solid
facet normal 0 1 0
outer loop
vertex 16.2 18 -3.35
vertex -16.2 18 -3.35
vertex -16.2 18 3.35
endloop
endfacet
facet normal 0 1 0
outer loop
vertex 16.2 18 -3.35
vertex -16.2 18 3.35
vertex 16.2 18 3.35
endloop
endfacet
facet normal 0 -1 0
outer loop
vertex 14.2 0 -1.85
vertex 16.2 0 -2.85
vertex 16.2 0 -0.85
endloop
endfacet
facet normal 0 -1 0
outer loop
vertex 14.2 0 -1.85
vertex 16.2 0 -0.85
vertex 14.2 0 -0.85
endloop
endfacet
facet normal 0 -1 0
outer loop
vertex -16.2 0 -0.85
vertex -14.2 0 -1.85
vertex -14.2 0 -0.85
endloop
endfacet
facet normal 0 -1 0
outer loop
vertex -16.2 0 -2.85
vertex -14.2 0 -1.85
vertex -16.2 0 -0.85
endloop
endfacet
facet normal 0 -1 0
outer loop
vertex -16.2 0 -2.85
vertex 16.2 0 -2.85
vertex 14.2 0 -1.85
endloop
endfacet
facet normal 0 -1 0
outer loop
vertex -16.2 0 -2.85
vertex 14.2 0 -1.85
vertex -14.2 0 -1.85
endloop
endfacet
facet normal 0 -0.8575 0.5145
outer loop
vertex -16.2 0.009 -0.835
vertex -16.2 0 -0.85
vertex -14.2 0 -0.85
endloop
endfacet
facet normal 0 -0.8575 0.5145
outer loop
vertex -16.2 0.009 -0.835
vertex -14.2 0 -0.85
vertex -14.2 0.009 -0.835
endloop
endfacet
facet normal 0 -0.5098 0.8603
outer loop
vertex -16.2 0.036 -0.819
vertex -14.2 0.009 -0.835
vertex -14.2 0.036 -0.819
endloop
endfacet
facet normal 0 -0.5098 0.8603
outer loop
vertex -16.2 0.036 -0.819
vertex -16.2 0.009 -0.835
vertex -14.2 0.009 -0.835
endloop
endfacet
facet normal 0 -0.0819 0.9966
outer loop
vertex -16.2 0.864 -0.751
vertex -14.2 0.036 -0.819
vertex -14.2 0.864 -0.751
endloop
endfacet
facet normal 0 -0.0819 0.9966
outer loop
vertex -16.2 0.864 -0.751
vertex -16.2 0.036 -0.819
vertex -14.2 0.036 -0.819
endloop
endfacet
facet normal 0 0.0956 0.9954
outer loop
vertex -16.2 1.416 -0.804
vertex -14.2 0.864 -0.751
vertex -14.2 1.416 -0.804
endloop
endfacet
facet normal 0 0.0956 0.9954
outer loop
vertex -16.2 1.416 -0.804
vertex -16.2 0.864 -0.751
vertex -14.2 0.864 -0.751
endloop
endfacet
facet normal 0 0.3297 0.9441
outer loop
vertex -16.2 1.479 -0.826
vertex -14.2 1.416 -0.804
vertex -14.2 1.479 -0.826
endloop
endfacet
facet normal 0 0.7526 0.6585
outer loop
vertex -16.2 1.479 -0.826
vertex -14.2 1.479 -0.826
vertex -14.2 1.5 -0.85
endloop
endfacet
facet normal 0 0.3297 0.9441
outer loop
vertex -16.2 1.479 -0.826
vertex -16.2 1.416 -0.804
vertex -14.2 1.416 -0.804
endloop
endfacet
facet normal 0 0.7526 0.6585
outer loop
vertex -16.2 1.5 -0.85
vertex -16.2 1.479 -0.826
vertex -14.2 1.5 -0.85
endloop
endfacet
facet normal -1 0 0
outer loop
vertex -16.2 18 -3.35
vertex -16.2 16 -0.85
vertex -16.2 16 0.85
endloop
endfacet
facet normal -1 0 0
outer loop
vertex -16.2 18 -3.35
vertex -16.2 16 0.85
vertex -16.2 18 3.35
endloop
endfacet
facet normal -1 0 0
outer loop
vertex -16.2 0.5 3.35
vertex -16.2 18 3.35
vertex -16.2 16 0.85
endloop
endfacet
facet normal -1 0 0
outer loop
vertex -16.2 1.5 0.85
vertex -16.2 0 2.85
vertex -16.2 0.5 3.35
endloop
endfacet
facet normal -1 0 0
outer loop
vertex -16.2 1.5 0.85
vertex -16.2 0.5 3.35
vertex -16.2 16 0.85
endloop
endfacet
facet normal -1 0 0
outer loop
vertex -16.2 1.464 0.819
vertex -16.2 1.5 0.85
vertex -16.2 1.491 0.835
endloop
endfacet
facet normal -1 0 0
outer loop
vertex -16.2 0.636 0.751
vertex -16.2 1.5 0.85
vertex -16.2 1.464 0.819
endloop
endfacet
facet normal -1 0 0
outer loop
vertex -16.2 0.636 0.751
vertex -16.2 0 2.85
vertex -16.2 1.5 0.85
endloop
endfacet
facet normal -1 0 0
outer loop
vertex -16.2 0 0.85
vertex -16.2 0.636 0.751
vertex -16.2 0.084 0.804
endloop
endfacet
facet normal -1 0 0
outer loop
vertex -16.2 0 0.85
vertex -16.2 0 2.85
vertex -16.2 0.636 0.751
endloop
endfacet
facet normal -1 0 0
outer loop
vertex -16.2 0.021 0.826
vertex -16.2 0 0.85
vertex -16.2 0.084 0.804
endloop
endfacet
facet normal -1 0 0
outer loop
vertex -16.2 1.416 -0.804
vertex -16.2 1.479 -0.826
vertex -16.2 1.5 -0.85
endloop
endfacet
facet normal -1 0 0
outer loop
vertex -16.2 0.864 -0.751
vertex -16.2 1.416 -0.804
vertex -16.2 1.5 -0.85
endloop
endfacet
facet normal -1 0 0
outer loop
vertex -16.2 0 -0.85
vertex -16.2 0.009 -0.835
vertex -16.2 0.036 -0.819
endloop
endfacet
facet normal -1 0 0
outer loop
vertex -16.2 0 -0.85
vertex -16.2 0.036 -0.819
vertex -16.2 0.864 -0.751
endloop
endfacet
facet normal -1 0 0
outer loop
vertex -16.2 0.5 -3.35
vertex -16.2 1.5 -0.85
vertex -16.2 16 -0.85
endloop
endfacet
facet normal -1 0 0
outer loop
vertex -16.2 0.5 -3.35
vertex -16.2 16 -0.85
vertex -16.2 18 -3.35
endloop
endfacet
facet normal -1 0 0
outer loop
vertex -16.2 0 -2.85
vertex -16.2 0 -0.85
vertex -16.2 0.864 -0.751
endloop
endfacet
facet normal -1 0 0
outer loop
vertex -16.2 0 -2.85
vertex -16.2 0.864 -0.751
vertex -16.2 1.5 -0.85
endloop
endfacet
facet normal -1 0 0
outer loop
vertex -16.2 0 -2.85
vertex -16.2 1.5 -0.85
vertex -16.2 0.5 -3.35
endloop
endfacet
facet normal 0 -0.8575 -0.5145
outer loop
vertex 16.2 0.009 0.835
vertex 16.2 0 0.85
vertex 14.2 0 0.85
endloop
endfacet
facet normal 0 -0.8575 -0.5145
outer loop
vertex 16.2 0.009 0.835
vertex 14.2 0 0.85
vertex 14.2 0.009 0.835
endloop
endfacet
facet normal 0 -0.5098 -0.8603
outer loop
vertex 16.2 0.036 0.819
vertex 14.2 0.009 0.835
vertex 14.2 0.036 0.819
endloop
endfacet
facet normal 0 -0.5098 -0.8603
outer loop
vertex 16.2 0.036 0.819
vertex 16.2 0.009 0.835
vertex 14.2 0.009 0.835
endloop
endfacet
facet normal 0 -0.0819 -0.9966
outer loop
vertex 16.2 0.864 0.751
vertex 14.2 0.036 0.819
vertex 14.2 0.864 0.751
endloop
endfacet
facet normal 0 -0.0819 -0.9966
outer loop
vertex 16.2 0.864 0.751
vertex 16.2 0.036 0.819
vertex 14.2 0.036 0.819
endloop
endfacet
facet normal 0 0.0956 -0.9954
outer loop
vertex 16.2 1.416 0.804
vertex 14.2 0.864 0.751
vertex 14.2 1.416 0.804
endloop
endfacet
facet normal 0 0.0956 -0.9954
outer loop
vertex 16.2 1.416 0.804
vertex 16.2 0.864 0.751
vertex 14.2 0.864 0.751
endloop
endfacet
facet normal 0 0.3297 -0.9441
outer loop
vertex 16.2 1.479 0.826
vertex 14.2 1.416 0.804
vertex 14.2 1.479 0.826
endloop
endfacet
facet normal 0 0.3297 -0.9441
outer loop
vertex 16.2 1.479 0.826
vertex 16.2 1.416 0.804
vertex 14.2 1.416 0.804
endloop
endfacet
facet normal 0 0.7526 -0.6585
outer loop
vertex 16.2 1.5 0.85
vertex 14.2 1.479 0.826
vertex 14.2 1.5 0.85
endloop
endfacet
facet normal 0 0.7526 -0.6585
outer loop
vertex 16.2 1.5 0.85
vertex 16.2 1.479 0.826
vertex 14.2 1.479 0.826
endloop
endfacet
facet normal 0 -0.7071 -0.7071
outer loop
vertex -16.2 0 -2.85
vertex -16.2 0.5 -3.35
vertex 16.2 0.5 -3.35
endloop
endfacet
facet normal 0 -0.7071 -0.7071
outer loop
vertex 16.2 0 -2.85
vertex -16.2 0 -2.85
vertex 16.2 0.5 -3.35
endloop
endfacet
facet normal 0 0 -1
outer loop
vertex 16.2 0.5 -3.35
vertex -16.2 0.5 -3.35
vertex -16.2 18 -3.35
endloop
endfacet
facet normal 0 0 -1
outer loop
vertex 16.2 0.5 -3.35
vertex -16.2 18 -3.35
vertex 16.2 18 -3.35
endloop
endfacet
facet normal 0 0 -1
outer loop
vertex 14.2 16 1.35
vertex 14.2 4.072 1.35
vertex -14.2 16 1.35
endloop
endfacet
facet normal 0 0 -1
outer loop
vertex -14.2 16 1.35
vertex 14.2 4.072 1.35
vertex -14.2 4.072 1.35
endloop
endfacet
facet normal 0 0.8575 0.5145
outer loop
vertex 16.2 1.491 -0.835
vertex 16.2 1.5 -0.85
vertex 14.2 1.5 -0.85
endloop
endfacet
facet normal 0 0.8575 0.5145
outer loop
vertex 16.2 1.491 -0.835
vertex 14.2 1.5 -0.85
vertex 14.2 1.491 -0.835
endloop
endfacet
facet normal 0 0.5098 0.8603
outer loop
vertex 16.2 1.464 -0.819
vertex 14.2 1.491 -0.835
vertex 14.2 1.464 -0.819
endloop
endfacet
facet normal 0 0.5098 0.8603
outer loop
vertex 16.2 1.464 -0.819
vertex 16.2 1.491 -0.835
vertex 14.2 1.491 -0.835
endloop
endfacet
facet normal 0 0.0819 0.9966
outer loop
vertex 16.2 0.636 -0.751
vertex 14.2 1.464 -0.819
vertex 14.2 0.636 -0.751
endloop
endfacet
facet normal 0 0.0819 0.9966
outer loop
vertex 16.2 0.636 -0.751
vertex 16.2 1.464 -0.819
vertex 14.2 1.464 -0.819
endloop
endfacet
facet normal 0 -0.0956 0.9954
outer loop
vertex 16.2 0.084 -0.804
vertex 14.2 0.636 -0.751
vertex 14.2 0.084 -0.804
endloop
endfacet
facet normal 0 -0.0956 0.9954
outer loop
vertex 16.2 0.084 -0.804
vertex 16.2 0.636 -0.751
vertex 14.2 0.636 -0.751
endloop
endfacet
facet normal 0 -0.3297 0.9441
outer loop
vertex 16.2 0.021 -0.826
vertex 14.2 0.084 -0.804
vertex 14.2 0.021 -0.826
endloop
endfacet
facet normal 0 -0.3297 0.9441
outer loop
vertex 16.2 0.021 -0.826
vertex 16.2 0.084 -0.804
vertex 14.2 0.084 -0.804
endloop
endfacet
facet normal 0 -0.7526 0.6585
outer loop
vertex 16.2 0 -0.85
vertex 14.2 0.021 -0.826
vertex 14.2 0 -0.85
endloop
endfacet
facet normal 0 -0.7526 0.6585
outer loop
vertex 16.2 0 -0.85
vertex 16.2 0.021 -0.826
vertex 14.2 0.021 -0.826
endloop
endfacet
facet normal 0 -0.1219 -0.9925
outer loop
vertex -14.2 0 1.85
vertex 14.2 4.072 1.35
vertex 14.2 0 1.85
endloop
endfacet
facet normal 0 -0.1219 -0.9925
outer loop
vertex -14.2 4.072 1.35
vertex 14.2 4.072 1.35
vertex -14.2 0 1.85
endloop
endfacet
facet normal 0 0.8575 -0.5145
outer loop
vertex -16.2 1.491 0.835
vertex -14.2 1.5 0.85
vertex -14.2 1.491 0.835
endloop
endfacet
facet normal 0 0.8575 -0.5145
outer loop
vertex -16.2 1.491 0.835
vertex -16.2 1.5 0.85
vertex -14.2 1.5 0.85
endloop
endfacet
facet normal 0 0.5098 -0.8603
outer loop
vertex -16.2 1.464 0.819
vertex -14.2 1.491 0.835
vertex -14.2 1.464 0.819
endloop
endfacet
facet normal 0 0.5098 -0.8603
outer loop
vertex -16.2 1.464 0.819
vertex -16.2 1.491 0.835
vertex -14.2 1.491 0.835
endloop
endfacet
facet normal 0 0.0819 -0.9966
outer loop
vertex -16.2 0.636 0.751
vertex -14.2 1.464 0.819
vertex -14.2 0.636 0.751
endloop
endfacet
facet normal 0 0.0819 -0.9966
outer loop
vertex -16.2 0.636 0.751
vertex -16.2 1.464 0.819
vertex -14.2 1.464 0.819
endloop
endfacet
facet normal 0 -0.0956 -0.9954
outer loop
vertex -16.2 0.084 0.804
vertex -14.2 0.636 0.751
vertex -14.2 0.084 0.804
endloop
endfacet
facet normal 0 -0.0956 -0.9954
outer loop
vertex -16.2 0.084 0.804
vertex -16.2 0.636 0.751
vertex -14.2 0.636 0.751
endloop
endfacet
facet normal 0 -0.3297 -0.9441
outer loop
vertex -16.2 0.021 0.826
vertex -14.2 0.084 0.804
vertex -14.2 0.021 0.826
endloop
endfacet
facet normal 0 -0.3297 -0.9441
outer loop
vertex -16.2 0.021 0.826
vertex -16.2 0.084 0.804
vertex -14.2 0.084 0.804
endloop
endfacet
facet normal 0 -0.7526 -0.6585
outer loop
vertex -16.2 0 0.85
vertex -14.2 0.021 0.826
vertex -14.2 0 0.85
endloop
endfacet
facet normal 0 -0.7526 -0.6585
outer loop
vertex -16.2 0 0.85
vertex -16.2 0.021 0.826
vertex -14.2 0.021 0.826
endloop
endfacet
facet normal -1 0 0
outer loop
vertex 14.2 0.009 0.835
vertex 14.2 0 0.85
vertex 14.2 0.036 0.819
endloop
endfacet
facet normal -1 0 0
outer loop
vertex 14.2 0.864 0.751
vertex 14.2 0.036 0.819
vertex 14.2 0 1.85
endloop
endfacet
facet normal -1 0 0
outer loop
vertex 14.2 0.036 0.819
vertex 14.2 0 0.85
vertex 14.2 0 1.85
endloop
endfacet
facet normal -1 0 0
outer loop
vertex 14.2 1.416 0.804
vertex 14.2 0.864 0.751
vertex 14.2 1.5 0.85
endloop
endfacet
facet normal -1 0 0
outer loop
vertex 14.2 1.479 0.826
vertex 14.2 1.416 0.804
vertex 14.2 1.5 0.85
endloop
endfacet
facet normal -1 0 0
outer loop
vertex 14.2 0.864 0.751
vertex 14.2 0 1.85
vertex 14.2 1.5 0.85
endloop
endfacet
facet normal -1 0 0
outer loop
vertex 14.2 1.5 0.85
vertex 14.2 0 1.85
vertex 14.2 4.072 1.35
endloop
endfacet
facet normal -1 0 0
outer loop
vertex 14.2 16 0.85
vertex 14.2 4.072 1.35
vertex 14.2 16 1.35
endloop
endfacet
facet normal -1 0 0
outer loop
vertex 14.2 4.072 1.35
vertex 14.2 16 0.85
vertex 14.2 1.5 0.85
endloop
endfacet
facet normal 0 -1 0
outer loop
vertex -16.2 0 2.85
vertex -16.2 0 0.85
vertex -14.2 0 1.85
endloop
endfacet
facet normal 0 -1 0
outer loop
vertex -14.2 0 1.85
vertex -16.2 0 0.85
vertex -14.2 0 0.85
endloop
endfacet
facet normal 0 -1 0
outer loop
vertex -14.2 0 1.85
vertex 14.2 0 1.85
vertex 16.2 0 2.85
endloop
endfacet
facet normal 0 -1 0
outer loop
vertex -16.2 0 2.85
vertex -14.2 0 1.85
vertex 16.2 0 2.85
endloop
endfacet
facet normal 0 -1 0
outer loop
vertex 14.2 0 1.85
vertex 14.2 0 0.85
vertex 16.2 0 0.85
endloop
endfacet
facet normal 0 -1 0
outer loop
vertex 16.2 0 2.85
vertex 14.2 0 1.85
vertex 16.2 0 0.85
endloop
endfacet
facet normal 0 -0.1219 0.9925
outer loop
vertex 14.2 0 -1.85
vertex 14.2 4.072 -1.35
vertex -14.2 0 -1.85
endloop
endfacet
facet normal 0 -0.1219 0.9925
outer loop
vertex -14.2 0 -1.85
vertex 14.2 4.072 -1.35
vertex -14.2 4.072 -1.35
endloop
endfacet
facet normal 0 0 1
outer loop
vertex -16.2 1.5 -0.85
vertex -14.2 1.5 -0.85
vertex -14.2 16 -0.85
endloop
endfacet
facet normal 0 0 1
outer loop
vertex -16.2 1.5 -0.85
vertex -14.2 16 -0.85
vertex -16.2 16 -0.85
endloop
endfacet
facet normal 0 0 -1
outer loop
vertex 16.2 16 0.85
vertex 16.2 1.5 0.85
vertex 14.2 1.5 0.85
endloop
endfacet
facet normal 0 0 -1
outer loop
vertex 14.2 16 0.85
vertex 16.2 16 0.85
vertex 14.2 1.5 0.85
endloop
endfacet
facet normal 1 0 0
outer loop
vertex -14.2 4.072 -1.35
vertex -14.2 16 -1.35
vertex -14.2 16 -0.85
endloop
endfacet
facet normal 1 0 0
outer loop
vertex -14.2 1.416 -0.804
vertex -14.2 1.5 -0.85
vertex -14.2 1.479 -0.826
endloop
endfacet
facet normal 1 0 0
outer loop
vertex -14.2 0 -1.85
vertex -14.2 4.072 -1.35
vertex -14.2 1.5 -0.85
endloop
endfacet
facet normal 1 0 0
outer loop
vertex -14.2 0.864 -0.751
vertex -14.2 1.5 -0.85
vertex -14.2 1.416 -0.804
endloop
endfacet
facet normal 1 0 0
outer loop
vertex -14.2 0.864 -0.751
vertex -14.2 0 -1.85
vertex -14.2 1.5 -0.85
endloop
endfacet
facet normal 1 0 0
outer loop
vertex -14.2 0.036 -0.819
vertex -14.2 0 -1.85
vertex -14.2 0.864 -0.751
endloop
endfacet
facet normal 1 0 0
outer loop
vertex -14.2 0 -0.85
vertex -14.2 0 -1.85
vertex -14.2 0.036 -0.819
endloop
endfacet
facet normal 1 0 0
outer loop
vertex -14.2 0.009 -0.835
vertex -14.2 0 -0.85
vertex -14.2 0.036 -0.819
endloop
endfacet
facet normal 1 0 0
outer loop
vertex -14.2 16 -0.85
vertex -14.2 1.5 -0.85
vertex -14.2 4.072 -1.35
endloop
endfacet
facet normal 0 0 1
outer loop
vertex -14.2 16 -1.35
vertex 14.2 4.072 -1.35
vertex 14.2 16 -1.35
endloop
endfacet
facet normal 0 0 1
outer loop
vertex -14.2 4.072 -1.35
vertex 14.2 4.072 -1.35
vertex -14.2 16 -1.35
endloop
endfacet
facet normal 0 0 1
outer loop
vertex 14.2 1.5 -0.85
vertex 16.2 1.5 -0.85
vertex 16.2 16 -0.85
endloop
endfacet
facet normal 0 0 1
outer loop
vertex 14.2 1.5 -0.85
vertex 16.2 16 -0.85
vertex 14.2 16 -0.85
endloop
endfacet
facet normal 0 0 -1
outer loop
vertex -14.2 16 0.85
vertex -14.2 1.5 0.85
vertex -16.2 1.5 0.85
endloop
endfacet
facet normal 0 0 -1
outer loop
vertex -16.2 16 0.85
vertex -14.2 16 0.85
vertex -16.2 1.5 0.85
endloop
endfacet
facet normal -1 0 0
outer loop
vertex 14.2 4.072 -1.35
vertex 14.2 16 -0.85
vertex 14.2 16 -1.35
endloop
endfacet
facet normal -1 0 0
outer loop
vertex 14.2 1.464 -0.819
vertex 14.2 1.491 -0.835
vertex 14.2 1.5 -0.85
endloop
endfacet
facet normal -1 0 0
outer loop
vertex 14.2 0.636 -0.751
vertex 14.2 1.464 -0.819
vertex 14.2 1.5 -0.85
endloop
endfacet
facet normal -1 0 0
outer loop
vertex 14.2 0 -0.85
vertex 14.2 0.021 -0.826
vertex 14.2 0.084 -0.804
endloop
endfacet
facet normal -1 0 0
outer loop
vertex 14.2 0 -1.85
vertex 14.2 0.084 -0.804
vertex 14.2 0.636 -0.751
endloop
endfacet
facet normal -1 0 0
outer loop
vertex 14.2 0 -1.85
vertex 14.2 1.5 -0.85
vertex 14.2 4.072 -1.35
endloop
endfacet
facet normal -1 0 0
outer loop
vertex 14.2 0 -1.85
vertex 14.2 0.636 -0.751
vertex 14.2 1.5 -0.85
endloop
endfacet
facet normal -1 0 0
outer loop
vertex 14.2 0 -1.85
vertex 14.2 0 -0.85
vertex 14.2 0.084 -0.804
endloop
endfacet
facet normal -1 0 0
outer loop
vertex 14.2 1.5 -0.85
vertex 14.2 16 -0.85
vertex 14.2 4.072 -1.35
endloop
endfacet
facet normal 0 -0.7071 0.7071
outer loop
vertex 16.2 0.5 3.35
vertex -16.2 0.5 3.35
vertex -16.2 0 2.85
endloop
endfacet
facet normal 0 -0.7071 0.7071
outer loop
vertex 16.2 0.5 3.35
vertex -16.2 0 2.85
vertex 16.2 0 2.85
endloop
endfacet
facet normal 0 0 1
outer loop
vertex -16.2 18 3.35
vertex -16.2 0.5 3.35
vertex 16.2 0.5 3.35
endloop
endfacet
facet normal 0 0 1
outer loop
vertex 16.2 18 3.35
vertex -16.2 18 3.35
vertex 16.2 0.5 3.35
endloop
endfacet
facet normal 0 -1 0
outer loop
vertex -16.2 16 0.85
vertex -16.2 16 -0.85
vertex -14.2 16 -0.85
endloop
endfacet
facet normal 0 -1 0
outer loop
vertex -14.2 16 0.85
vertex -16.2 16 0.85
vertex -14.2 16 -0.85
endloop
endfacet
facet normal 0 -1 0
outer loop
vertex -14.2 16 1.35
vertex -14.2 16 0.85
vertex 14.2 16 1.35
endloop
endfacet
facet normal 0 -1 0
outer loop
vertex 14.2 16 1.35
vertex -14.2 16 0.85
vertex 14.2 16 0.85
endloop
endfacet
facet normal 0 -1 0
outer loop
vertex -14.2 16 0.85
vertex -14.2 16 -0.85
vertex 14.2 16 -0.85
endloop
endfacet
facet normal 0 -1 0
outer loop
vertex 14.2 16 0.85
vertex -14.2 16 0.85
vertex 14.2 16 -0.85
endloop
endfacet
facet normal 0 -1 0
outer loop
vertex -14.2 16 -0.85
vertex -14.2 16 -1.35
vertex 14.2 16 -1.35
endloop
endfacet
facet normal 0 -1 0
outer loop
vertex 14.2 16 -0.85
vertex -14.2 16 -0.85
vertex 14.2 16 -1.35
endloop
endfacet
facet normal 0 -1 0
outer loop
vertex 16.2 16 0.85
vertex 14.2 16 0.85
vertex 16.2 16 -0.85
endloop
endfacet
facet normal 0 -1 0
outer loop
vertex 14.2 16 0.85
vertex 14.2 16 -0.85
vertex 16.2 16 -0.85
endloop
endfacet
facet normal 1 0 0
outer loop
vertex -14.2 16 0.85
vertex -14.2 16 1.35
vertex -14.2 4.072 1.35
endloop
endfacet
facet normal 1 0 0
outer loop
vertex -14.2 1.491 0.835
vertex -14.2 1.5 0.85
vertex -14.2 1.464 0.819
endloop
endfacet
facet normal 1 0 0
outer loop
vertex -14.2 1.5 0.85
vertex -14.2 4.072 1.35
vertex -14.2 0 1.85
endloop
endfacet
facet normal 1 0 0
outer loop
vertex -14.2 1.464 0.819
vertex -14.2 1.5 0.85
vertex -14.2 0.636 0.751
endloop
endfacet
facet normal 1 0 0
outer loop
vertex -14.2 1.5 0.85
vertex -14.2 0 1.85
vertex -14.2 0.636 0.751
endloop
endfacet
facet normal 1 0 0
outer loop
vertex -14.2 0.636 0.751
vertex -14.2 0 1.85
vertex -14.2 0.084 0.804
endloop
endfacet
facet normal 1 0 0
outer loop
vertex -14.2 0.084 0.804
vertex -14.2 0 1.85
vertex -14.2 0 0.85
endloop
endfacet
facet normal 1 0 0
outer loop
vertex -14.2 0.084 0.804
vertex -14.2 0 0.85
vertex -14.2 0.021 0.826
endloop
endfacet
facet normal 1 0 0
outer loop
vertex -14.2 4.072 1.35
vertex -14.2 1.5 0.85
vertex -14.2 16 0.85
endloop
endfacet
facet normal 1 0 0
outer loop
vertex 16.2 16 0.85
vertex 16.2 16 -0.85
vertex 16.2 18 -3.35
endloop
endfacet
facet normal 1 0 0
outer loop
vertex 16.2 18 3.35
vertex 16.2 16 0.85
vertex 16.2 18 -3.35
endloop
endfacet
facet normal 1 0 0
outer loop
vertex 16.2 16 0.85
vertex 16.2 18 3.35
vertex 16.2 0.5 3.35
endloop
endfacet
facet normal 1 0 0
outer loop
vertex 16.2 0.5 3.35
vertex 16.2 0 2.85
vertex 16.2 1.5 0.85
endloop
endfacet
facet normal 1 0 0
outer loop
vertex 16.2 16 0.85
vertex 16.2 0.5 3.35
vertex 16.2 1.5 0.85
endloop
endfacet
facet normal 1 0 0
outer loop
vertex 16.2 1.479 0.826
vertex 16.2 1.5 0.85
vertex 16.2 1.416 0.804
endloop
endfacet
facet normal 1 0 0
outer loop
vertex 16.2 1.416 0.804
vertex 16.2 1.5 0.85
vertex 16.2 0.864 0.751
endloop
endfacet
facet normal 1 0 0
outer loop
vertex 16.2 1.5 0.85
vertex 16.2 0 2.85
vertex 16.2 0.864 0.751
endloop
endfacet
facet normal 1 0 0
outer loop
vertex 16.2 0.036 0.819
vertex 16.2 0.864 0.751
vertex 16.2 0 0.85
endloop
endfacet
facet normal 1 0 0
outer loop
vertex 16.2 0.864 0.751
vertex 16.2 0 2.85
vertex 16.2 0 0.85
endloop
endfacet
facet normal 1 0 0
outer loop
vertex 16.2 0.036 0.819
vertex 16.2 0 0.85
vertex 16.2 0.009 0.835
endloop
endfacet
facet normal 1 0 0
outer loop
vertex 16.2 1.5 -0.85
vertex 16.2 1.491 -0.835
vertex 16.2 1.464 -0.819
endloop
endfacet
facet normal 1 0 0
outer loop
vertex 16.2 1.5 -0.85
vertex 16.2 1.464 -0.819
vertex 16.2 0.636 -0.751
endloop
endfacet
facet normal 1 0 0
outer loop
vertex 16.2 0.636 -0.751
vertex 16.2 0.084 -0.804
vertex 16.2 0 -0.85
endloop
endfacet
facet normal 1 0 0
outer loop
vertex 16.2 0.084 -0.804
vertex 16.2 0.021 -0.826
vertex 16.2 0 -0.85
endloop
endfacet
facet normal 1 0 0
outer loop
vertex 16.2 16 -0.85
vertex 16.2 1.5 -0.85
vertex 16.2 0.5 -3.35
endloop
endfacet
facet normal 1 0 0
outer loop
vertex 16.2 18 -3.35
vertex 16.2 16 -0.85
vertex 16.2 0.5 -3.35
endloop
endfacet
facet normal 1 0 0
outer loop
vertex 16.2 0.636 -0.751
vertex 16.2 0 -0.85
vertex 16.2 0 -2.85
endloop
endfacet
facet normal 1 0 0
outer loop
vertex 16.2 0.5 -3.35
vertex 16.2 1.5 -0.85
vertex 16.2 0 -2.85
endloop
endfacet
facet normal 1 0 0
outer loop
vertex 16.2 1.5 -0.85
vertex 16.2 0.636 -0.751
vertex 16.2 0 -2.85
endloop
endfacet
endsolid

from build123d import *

# Parameters (mm, degrees)
BOSS_EXTRUDE1_DEPTH   = 16
BOSS_EXTRUDE1_2_DEPTH = 16
SKETCH2_W             = 32.4
SKETCH2_H             = 6.7
BOSS_EXTRUDE2_DEPTH   = 2
CHAMFER1_SIZE         = 0.5
CHAMFER1_SIZE2        = 4.072173214
CHAMFER1_PART_2_SIZE  = 0.5
CHAMFER1_PART_2_SIZE2 = 4.072173214
CHAMFER4_SIZE         = 0.5
SKETCH4_RX            = 0.75
SKETCH4_RY            = 0.1
BOSS_EXTRUDE3_DEPTH   = 2
SKETCH5_RX            = 0.75
SKETCH5_RY            = 0.1
BOSS_EXTRUDE4_DEPTH   = 2


with BuildPart() as part:
    # Sketch1 → Boss-Extrude1 (new body)
    with BuildSketch(Plane(origin=(0, 0, 0), x_dir=(1, 0, 0), z_dir=(0, 1, 0))):
        Polygon((-14.2, 0.85), (-16.2, 0.85), (-16.2, 3.35), (16.2, 3.35), (16.2, 0.85), (14.2, 0.85), (14.2, 1.35), (-14.2, 1.35), align=None)
    extrude(amount=BOSS_EXTRUDE1_DEPTH)



with BuildPart() as body_2:
    # Sketch1 → Boss-Extrude1 2 (new body)
    with BuildSketch(Plane(origin=(0, 0, 0), x_dir=(1, 0, 0), z_dir=(0, 1, 0))):
        Polygon((-16.2, -3.35), (16.2, -3.35), (16.2, -0.85), (14.2, -0.85), (14.2, -1.35), (-14.2, -1.35), (-14.2, -0.85), (-16.2, -0.85), align=None)
    extrude(amount=BOSS_EXTRUDE1_2_DEPTH)


with BuildPart() as part_1:
    add(part.part)

    add(body_2.part)  # Boss-Extrude2 merges body 2
    # Sketch2 → Boss-Extrude2 (add)
    with BuildSketch(Plane(origin=(0, 16, 0), x_dir=(1, 0, 0), z_dir=(0, 1, 0))):
        Rectangle(SKETCH2_W, SKETCH2_H)
    extrude(amount=BOSS_EXTRUDE2_DEPTH)

    # Chamfer1
    chamfer1_edges = [part_1.edges().sort_by_distance(p)[0] for p in [
        (0, 0, 1.35),
    ]]
    chamfer1_side = [part_1.faces().sort_by_distance(p)[0] for p in [
        (0, 0, 2.31257485),
    ]]
    chamfer(chamfer1_edges, length=CHAMFER1_SIZE, length2=CHAMFER1_SIZE2, reference=chamfer1_side[0])

    # Chamfer1 part 2
    chamfer1_part_2_edges = [part_1.edges().sort_by_distance(p)[0] for p in [
        (0, 0, -1.35),
    ]]
    chamfer1_part_2_side = [part_1.faces().sort_by_distance(p)[0] for p in [
        (0, 0, -2.31257485),
    ]]
    chamfer(chamfer1_part_2_edges, length=CHAMFER1_PART_2_SIZE, length2=CHAMFER1_PART_2_SIZE2, reference=chamfer1_part_2_side[0])

    # Chamfer4
    chamfer4_edges = [part_1.edges().sort_by_distance(p)[0] for p in [
        (0, 0, -3.35),
        (0, 0, 3.35),
    ]]
    chamfer(chamfer4_edges, length=CHAMFER4_SIZE)

    # Sketch4 → Boss-Extrude3 (add)
    with BuildSketch(Plane(origin=(16.2, 0, 0), x_dir=(0, 0, -1), z_dir=(1, 0, 0))):
        with Locations(Location((-0.85, 0.75), (0, 0, 90))):
            Ellipse(SKETCH4_RX, SKETCH4_RY)
        with Locations(Location((0.85, 0.75), (0, 0, 90))):
            Ellipse(SKETCH4_RX, SKETCH4_RY)
    extrude(amount=-BOSS_EXTRUDE3_DEPTH)

    # Sketch5 → Boss-Extrude4 (add)
    with BuildSketch(Plane.ZY.offset(16.2)):
        with Locations(Location((-0.85, 0.75), (0, 0, -90))):
            Ellipse(SKETCH5_RX, SKETCH5_RY)
        with Locations(Location((0.85, 0.75), (0, 0, -90))):
            Ellipse(SKETCH5_RX, SKETCH5_RY)
    extrude(amount=-BOSS_EXTRUDE4_DEPTH)


solid = part_1.part
